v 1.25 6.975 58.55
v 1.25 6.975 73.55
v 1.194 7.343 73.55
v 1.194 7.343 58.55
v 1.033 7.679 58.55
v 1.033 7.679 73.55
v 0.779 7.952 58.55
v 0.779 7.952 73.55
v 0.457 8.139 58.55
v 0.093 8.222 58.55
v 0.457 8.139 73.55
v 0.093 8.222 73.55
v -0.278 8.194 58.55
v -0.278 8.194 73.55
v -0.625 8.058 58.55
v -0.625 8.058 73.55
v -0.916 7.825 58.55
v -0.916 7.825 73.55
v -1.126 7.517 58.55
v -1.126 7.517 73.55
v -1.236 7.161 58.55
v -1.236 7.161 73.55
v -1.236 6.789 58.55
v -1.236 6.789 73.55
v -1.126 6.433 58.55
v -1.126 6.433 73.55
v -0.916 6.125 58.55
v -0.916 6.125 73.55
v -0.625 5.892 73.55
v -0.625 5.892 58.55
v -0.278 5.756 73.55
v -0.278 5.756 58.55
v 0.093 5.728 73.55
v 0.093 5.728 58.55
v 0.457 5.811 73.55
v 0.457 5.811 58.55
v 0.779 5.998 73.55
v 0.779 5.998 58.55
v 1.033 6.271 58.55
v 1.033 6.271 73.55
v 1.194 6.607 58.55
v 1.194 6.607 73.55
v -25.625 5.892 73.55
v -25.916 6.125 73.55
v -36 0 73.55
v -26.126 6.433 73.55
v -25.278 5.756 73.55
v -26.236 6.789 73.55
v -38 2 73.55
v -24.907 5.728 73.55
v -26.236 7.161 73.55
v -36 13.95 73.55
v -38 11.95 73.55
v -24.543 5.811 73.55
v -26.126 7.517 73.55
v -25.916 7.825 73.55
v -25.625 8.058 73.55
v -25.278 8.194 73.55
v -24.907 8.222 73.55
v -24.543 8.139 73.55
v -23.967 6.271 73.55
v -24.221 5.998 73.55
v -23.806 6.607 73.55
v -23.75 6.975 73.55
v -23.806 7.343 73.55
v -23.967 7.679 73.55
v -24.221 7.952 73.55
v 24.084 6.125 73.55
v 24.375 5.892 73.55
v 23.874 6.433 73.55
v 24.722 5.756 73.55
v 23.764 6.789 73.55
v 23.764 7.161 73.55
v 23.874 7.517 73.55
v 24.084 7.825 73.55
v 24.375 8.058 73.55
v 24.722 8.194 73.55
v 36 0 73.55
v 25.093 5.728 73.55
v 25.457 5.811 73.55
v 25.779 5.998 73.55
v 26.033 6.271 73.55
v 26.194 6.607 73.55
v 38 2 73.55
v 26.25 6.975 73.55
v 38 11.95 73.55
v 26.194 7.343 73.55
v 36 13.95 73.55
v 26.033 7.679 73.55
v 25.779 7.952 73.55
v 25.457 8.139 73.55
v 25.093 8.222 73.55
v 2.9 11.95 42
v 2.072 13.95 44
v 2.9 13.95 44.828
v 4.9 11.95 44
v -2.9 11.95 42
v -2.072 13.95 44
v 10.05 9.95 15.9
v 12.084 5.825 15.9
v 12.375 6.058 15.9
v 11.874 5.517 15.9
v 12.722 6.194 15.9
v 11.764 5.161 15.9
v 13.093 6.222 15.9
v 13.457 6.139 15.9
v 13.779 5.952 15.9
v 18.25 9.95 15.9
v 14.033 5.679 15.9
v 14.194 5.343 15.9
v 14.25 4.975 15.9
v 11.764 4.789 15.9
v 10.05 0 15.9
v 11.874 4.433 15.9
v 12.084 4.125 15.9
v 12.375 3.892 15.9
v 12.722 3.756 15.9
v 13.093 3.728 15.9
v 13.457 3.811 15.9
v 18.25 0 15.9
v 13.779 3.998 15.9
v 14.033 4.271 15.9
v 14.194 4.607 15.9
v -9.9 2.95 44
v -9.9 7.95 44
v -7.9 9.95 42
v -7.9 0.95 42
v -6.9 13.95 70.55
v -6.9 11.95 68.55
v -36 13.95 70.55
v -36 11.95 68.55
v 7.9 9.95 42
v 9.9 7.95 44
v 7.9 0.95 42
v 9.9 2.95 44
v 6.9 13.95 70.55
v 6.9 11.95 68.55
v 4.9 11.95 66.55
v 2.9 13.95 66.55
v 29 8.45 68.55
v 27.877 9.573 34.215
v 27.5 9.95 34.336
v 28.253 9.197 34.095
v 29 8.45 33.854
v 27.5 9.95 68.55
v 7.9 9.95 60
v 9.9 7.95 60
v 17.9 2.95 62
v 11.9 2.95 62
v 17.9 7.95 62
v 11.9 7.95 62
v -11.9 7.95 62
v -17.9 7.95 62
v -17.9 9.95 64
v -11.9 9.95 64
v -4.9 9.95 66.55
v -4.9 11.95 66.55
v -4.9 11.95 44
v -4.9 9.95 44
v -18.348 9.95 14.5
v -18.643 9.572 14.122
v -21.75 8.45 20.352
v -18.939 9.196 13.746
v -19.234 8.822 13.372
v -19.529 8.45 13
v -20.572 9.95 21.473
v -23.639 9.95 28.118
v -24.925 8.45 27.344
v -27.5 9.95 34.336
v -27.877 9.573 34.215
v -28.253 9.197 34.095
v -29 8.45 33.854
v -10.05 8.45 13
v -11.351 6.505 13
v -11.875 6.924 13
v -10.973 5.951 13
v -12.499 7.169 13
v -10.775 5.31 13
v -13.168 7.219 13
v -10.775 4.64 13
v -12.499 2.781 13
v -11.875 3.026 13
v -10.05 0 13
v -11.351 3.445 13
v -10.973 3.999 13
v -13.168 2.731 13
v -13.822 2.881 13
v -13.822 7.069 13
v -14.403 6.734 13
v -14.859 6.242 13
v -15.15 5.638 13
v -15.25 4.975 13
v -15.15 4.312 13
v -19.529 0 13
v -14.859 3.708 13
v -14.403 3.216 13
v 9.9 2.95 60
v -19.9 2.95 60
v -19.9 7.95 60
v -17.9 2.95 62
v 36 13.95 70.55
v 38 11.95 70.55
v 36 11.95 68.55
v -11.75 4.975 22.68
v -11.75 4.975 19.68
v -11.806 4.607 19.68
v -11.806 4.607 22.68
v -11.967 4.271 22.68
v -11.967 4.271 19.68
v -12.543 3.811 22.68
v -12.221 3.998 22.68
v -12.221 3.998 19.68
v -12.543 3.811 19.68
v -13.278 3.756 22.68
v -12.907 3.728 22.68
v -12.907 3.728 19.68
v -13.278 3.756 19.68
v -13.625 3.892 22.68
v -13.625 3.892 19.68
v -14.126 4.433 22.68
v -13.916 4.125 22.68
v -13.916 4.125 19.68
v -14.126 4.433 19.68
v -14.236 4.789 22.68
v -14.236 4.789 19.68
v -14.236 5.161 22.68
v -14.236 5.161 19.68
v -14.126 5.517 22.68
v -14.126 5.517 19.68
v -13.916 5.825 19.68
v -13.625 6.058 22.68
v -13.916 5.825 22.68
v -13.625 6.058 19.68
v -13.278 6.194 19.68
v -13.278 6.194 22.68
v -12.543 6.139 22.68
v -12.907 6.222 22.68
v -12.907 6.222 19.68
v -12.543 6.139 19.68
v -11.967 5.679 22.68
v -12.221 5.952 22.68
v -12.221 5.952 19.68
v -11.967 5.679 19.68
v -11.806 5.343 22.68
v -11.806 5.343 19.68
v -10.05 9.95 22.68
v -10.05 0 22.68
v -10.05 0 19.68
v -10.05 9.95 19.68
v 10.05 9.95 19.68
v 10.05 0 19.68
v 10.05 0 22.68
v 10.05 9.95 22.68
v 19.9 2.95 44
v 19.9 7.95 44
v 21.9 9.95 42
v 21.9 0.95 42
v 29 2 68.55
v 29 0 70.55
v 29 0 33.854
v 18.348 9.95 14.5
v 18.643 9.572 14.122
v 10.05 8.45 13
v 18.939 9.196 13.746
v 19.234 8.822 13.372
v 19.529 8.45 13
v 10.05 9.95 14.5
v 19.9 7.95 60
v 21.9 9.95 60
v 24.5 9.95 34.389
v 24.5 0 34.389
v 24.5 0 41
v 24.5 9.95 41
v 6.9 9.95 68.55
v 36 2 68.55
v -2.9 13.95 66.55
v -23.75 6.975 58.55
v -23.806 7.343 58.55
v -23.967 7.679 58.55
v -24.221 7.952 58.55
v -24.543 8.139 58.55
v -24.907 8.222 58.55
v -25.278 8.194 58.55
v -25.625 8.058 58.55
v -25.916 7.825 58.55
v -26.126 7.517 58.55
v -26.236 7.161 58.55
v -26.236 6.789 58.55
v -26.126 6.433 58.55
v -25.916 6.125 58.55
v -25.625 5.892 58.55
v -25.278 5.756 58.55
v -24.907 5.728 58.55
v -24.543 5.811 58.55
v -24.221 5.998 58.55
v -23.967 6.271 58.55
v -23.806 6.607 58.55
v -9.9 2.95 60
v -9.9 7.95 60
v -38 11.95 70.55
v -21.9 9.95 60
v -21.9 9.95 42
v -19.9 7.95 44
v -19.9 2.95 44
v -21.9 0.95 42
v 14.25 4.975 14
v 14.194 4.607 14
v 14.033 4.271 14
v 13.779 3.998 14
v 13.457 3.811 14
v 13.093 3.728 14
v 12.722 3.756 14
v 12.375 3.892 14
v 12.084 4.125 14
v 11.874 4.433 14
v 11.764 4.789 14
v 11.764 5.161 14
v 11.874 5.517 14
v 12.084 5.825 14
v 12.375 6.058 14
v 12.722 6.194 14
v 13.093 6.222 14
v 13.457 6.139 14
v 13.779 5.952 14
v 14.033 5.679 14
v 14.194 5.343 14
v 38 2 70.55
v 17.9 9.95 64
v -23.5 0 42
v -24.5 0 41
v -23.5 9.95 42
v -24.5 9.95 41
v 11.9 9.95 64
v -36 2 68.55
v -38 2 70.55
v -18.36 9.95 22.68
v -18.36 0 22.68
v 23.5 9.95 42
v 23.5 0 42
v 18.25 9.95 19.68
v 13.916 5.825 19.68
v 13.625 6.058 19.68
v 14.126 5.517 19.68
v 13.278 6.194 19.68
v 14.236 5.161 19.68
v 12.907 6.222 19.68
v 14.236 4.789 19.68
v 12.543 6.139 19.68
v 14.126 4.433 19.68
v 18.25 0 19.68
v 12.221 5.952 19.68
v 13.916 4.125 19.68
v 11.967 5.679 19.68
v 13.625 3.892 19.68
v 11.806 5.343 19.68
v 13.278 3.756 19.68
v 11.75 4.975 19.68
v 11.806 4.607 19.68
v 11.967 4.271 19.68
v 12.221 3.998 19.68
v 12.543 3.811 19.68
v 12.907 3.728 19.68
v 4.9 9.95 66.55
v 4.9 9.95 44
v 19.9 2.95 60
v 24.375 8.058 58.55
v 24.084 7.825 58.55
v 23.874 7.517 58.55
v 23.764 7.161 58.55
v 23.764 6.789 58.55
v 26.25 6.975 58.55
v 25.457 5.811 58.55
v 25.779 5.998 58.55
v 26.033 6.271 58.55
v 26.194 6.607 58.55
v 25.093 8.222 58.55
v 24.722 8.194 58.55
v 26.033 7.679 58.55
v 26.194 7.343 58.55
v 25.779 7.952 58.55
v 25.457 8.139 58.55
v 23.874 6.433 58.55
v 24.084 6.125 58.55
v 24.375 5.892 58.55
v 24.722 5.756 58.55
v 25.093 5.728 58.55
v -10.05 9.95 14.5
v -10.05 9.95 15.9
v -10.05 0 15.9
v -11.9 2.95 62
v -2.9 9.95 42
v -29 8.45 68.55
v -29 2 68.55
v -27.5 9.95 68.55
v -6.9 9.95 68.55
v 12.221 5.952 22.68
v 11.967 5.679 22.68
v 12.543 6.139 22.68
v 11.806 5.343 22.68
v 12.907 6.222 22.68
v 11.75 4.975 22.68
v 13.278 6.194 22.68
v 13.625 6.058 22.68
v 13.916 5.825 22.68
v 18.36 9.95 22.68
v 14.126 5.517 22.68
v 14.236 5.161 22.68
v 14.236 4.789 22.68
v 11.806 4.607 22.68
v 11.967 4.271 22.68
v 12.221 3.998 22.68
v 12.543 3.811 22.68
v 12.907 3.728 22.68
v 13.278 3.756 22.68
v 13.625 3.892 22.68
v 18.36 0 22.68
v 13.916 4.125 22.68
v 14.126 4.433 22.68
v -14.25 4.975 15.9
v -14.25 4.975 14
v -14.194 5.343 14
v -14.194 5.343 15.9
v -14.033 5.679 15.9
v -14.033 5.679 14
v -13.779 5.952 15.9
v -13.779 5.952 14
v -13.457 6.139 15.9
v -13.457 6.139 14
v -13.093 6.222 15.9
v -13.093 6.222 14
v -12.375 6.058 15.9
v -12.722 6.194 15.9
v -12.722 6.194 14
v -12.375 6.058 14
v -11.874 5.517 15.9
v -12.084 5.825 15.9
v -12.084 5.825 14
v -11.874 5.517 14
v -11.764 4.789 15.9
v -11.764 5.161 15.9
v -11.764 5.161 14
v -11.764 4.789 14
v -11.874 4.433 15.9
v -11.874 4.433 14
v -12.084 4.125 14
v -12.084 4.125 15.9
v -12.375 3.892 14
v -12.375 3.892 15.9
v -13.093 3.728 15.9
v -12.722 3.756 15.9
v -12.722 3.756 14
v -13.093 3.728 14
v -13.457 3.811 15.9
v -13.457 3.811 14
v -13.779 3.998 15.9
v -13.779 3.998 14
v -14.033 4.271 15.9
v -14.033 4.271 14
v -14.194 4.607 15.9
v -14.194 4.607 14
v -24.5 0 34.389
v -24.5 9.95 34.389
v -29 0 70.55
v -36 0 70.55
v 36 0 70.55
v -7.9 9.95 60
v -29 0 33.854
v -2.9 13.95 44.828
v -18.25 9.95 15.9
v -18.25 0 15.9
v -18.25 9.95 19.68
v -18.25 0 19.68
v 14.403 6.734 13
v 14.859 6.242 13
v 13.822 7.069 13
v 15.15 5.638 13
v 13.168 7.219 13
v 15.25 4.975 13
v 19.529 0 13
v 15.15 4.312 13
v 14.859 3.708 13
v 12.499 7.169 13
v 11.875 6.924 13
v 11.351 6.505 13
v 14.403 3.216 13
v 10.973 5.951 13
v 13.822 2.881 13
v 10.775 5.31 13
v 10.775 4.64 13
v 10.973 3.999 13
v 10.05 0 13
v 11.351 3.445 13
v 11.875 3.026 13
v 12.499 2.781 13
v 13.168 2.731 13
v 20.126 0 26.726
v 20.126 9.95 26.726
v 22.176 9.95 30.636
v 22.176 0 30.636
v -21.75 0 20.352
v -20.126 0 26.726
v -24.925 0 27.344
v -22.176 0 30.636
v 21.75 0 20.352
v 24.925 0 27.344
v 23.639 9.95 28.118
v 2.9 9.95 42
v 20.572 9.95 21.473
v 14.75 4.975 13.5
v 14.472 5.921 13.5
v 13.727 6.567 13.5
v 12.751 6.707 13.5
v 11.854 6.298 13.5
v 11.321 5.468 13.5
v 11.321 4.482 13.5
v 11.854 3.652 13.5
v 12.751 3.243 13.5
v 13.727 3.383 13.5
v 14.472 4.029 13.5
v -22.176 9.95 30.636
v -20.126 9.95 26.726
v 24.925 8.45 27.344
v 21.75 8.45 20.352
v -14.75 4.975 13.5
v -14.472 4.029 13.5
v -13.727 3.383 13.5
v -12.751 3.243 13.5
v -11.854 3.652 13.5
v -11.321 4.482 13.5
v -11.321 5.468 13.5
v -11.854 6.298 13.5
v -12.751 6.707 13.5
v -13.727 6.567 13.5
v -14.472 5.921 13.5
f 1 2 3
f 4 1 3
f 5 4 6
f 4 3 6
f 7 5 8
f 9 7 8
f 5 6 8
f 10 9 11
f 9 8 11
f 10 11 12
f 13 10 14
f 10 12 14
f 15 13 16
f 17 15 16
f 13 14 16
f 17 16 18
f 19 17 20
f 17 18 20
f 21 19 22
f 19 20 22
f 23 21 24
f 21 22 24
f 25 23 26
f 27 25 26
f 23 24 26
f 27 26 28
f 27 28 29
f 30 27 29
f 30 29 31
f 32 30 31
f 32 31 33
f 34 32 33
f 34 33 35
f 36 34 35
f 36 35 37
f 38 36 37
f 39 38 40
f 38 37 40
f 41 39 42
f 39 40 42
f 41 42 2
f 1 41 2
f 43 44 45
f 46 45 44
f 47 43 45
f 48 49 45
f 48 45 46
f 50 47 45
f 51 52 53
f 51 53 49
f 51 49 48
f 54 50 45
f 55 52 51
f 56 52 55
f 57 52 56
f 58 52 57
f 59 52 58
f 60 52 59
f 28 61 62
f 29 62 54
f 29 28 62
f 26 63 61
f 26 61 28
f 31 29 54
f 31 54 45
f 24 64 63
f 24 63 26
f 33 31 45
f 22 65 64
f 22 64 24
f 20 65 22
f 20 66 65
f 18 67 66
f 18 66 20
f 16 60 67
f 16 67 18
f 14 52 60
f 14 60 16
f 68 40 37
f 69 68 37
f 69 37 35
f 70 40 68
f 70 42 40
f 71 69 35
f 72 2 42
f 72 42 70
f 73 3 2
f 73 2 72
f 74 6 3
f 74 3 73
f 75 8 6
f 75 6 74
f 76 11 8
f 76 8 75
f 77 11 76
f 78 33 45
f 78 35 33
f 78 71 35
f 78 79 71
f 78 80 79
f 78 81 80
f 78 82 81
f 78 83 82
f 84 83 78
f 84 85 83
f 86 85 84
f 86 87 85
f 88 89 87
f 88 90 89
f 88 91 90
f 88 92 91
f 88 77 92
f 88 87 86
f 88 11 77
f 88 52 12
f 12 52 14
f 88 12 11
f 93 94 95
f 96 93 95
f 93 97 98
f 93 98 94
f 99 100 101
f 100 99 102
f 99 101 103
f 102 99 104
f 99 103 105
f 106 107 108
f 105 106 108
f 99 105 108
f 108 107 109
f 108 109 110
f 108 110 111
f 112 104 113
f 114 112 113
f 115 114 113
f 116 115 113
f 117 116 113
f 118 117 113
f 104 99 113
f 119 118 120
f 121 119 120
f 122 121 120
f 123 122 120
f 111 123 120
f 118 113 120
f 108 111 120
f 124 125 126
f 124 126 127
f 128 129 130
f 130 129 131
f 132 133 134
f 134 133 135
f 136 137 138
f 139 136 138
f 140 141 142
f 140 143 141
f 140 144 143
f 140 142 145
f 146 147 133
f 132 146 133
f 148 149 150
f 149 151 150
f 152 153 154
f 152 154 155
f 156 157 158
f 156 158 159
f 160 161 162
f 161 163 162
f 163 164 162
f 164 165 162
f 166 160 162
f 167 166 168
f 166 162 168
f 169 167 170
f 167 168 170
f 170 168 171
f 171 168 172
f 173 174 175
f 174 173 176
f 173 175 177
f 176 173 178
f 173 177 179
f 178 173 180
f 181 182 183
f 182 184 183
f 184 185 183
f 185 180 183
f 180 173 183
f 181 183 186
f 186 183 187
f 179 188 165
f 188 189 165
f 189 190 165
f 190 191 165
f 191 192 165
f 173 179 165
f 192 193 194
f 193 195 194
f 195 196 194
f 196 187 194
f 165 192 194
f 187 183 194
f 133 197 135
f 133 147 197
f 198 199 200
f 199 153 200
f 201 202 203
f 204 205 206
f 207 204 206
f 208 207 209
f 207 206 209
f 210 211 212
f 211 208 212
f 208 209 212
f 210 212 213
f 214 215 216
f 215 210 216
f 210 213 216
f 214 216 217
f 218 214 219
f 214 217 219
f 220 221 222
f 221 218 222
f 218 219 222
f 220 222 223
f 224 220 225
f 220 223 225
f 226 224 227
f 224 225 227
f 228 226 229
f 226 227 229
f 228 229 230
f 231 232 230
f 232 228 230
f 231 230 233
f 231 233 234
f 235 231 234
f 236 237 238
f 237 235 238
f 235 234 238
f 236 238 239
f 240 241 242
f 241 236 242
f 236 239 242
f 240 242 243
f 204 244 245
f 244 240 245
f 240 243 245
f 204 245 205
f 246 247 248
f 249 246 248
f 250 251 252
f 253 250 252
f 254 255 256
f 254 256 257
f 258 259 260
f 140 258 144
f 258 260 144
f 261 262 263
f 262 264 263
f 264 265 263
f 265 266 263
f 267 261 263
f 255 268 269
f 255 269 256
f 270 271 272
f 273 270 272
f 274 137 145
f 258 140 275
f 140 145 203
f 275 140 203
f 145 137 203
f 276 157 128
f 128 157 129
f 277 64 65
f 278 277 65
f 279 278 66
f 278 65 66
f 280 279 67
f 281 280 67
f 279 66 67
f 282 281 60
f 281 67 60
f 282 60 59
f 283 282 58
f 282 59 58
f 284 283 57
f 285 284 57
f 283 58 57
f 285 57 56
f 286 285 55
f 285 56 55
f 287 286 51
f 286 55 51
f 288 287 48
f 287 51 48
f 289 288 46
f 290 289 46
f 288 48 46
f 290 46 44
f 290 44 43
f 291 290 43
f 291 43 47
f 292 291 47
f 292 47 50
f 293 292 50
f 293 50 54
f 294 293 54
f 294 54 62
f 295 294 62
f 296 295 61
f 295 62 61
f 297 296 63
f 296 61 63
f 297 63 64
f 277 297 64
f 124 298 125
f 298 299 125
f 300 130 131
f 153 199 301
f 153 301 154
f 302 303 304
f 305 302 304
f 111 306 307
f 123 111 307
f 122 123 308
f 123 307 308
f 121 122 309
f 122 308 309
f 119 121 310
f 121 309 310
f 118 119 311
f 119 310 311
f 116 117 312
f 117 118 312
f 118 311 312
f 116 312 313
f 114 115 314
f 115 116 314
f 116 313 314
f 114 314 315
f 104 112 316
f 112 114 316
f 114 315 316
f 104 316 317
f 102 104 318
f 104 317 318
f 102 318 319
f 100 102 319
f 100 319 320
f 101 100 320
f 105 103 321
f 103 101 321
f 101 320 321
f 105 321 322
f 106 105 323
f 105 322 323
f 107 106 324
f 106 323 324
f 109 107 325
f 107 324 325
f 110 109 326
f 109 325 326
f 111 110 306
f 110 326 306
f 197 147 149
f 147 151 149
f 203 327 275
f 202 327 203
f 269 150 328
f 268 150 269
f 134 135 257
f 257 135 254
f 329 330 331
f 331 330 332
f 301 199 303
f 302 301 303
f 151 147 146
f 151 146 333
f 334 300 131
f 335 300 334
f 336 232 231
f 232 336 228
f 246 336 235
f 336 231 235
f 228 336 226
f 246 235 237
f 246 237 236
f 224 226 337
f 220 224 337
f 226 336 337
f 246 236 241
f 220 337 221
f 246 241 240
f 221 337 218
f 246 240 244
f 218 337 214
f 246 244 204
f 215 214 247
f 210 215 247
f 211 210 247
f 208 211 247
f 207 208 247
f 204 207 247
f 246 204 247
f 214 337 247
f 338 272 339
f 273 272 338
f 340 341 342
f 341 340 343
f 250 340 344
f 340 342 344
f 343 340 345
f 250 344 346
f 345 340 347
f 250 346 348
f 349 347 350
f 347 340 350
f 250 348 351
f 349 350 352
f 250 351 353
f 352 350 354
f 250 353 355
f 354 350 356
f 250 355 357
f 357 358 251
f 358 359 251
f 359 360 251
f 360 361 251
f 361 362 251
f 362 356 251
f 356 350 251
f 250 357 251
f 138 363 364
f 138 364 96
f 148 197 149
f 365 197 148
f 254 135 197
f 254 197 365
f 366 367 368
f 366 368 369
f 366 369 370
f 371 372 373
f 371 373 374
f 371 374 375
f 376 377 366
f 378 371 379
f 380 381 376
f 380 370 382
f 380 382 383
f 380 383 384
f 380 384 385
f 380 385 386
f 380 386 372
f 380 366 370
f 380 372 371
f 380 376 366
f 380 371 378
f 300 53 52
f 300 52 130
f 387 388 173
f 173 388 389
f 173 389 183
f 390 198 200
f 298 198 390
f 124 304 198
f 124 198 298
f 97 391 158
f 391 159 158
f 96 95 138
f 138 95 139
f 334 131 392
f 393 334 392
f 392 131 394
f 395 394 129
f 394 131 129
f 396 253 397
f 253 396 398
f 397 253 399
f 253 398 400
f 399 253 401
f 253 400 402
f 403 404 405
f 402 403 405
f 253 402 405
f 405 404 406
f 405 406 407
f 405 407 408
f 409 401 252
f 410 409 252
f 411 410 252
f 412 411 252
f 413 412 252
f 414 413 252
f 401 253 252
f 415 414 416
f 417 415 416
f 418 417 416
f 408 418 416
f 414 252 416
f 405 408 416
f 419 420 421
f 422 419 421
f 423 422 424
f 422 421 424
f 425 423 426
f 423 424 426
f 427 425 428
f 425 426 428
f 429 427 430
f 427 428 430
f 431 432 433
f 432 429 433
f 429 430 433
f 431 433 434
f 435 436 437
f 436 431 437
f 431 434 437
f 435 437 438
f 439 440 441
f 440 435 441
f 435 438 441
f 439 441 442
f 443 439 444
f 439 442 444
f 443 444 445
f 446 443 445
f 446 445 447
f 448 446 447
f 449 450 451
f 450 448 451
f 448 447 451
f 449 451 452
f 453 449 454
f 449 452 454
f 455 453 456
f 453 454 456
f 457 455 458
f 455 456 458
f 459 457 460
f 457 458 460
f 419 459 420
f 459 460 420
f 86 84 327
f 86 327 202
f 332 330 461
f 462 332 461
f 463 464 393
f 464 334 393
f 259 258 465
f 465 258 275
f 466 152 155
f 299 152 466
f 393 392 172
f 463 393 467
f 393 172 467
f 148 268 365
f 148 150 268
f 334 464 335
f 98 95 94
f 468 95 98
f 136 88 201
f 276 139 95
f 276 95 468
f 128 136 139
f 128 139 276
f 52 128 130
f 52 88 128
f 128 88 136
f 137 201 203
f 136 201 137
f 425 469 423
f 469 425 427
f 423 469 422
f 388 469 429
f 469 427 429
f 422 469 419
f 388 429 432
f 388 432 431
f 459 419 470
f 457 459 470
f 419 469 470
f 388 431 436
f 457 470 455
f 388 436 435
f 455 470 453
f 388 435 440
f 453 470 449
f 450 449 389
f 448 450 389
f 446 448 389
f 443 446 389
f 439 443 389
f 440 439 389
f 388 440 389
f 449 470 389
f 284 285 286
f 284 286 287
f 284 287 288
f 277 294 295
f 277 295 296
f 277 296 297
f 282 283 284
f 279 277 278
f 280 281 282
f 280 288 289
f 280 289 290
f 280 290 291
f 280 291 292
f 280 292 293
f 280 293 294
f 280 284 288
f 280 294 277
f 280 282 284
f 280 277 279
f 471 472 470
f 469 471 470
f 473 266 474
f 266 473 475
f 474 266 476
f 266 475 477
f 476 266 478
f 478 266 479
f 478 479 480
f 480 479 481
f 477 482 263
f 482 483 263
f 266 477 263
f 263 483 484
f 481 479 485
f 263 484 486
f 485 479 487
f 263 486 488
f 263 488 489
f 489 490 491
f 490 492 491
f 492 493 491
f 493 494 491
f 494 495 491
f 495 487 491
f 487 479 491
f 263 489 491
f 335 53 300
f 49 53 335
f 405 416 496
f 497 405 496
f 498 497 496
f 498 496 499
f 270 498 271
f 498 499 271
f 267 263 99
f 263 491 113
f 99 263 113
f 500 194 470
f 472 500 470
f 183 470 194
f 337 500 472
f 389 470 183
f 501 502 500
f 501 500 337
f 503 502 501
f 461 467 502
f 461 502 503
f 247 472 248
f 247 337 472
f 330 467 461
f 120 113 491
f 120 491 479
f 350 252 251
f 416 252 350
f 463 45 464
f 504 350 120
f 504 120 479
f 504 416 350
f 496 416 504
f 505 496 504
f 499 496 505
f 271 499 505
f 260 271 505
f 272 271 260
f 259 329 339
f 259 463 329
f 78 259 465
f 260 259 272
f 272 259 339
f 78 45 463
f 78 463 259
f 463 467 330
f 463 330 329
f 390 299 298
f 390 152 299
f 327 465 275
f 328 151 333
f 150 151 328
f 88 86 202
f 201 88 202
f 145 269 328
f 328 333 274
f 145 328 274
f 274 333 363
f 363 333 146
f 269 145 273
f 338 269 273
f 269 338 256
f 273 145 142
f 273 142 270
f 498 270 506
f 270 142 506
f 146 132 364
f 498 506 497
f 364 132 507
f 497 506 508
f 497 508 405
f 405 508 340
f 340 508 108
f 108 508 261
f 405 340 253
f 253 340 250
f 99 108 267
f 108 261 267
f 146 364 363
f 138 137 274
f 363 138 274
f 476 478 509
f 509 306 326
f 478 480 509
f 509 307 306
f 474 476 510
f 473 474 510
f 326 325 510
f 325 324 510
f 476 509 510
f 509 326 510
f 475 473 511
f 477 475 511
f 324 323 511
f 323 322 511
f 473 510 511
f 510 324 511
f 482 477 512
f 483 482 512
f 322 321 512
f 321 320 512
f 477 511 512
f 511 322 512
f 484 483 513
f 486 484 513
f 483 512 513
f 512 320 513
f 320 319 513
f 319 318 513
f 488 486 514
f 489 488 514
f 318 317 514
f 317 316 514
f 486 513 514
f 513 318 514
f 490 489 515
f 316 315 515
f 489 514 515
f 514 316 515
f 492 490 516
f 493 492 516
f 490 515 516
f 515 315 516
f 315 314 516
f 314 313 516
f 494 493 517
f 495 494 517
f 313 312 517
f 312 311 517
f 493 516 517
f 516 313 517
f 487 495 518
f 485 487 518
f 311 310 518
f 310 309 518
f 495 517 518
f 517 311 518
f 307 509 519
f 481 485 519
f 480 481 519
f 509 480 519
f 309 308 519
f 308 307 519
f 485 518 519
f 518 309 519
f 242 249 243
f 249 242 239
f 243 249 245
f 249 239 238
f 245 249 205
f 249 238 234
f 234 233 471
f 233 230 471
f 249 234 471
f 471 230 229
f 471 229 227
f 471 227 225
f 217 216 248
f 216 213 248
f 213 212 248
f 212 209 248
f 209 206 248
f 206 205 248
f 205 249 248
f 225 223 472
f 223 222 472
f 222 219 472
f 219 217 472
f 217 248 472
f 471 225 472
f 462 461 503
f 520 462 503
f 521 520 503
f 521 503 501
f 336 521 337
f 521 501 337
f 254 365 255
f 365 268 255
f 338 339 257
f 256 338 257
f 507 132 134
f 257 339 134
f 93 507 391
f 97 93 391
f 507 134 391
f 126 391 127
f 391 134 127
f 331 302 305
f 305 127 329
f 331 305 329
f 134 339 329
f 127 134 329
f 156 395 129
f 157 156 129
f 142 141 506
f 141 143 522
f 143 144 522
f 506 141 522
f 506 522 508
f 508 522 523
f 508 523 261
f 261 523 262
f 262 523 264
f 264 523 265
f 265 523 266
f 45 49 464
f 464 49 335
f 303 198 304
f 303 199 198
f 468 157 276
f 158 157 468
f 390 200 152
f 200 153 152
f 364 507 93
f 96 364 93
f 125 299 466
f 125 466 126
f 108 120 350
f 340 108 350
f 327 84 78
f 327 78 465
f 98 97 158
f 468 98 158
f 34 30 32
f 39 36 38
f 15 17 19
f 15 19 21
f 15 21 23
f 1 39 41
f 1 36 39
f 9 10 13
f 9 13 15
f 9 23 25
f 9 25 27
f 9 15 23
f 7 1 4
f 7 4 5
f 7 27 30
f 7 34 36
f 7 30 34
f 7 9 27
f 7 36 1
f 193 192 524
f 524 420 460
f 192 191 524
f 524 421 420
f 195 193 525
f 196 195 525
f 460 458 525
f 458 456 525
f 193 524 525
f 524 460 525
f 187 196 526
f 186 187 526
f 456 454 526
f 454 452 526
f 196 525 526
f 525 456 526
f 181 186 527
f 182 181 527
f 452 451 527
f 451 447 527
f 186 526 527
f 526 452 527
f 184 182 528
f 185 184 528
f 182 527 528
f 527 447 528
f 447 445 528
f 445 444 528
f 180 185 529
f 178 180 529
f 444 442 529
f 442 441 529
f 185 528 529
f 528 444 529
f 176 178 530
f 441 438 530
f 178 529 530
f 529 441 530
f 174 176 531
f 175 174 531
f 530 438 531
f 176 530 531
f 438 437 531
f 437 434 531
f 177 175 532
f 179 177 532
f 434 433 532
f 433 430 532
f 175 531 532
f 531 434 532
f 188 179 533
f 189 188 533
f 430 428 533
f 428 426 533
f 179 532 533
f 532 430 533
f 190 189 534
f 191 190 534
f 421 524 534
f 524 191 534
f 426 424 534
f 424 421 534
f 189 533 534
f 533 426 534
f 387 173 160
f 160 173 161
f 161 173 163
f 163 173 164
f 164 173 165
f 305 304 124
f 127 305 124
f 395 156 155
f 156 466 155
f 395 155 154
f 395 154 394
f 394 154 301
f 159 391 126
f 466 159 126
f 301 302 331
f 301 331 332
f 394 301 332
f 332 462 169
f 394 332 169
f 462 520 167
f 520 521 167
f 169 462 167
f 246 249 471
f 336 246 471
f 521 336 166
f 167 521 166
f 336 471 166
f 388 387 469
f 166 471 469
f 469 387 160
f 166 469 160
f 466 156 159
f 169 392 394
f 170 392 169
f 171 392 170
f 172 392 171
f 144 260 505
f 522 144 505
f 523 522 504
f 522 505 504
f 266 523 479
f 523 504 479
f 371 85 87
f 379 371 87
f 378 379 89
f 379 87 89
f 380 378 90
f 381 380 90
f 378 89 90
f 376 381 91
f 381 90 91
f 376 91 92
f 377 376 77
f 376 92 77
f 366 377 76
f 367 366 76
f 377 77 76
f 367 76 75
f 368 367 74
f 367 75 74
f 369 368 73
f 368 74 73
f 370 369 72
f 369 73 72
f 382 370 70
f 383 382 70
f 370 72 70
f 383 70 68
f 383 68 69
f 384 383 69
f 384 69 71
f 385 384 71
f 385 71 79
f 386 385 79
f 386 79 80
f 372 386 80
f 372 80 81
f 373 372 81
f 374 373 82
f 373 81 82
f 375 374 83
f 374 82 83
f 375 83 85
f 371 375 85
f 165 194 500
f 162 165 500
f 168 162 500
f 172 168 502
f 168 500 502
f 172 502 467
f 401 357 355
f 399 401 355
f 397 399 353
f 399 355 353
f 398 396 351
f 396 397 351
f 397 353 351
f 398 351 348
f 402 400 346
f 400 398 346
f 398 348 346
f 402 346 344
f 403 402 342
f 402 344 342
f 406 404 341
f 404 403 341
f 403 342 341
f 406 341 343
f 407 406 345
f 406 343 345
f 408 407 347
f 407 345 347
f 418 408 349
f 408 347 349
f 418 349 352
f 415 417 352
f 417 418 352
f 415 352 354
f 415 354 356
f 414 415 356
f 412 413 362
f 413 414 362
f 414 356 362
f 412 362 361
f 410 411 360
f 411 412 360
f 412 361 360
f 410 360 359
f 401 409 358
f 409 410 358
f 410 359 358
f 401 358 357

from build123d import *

# Parameters (mm, degrees)
BOSS_EXTRUDE1_DEPTH = 9.95
SKETCH2_W           = 58
SKETCH2_H           = 9.95
BOSS_EXTRUDE2_DEPTH = 8.55
SKETCH3_W           = 9.8
SKETCH3_H           = 11.55
BOSS_EXTRUDE3_DEPTH = 4
BOSS_EXTRUDE4_DEPTH = 20
CHAMFER1_SIZE       = 2
CUT_EXTRUDE1_REACH  = 70.57
CHAMFER2_SIZE       = 1
BOSS_EXTRUDE5_DEPTH = 5
CHAMFER3_SIZE       = 2
SKETCH7_W           = 10
SKETCH7_H           = 20
CUT_EXTRUDE2_DEPTH  = 7
CHAMFER4_SIZE       = 2
CHAMFER5_SIZE       = 1
SKETCH8_R           = 1.25
CUT_EXTRUDE3_DEPTH  = 15
CHAMFER6_SIZE       = 1.5
CHAMFER7_SIZE       = 2


with BuildPart() as part:
    # Sketch1 → Boss-Extrude1 (new body)
    with BuildSketch(Plane(origin=(0, 0, 0), x_dir=(1, 0, 0), z_dir=(0, 1, 0))):
        with BuildLine():
            Line((-10.05, -13), (-19.52904451, -13))
            ThreePointArc((-19.52904451, -13), (-23.22122875, -23.900809511), (-29, -33.853983643))
            Line((-29, -33.853983643), (-29, -45))
            Line((-29, -45), (29, -45))
            Line((29, -45), (29, -33.853983643))
            ThreePointArc((29, -33.853983643), (23.22122875, -23.900809511), (19.52904451, -13))
            Line((19.52904451, -13), (10.05, -13))
            Line((10.05, -13), (10.05, -15.9))
            Line((10.05, -15.9), (18.25, -15.9))
            Line((18.25, -15.9), (18.25, -19.68))
            Line((18.25, -19.68), (10.05, -19.68))
            Line((10.05, -19.68), (10.05, -22.68))
            Line((10.05, -22.68), (18.360244512, -22.68))
            ThreePointArc((18.360244512, -22.68), (21.116099011, -28.699201931), (24.5, -34.389082421))
            Line((24.5, -34.389082421), (24.5, -42))
            Line((24.5, -42), (-24.5, -42))
            Line((-24.5, -42), (-24.5, -34.389082421))
            ThreePointArc((-24.5, -34.389082421), (-21.116099011, -28.699201931), (-18.360244512, -22.68))
            Line((-18.360244512, -22.68), (-10.05, -22.68))
            Line((-10.05, -22.68), (-10.05, -19.68))
            Line((-10.05, -19.68), (-18.25, -19.68))
            Line((-18.25, -19.68), (-18.25, -15.9))
            Line((-18.25, -15.9), (-10.05, -15.9))
            Line((-10.05, -15.9), (-10.05, -13))
        make_face()
    extrude(amount=BOSS_EXTRUDE1_DEPTH)

    # Sketch2 → Boss-Extrude2 (add)
    with BuildSketch(Plane.XY.offset(45)):
        with Locations((0, 4.975)):
            Rectangle(SKETCH2_W, SKETCH2_H)
    extrude(amount=BOSS_EXTRUDE2_DEPTH)

    # Sketch3 → Boss-Extrude3 (add)
    with BuildSketch(Plane(origin=(0, 9.95, 0), x_dir=(1, 0, 0), z_dir=(0, 1, 0))):
        with Locations((0, -47.775)):
            Rectangle(SKETCH3_W, SKETCH3_H)
    extrude(amount=BOSS_EXTRUDE3_DEPTH)

    # Sketch4 → Boss-Extrude4 (add)
    with BuildSketch(Plane.XY.offset(53.55)):
        Polygon((-29, 9.95), (-29, 0), (29, 0), (29, 9.95), (4.9, 9.95), (4.9, 13.95), (-4.9, 13.95), (-4.9, 9.95), align=None)
    extrude(amount=BOSS_EXTRUDE4_DEPTH)

    # Chamfer1
    chamfer1_edges = [part.edges().sort_by_distance(p)[0] for p in [
        (4.9, 11.95, 42),
        (-4.9, 11.95, 42),
    ]]
    chamfer(chamfer1_edges, length=CHAMFER1_SIZE)

    # Cut-Extrude1: up to this face of the body (flat: up to its plane)
    cut_extrude1_end = Plane(part.part.faces().sort_by_distance((14.205122256, 4.975, 22.68))[0])
    # Sketch5 → Cut-Extrude1 (cut, up to the picked face)
    with BuildSketch(Plane(origin=(0, 0, 13), x_dir=(-1, 0, 0), z_dir=(0, 0, -1)), mode=Mode.PRIVATE) as cut_extrude1_sk1:
        with BuildLine():
            ThreePointArc((-14.25, 4.975), (-13, 3.725), (-11.75, 4.975))
            Line((-11.75, 4.975), (-14.25, 4.975))
        make_face()
    cut_extrude1_tool1 = split(extrude(cut_extrude1_sk1.sketch, amount=-CUT_EXTRUDE1_REACH, mode=Mode.PRIVATE), bisect_by=cut_extrude1_end, keep=Keep.BOTH, mode=Mode.PRIVATE)
    # Sketch5 → Cut-Extrude1 (cut, up to the picked face)
    with BuildSketch(Plane(origin=(0, 0, 13), x_dir=(-1, 0, 0), z_dir=(0, 0, -1)), mode=Mode.PRIVATE) as cut_extrude1_sk2:
        with BuildLine():
            Line((-14.25, 4.975), (-11.75, 4.975))
            ThreePointArc((-11.75, 4.975), (-13, 6.225), (-14.25, 4.975))
        make_face()
    cut_extrude1_tool2 = split(extrude(cut_extrude1_sk2.sketch, amount=-CUT_EXTRUDE1_REACH, mode=Mode.PRIVATE), bisect_by=cut_extrude1_end, keep=Keep.BOTH, mode=Mode.PRIVATE)
    # Sketch5 → Cut-Extrude1 (cut, up to the picked face)
    with BuildSketch(Plane(origin=(0, 0, 13), x_dir=(-1, 0, 0), z_dir=(0, 0, -1)), mode=Mode.PRIVATE) as cut_extrude1_sk3:
        with BuildLine():
            ThreePointArc((-14.25, 4.975), (-13, 3.725), (-11.75, 4.975))
            Line((-11.75, 4.975), (-14.25, 4.975))
        make_face()
    cut_extrude1_tool3 = split(extrude(cut_extrude1_sk3.sketch, amount=-CUT_EXTRUDE1_REACH, mode=Mode.PRIVATE), bisect_by=cut_extrude1_end, keep=Keep.BOTH, mode=Mode.PRIVATE)
    # Sketch5 → Cut-Extrude1 (cut, up to the picked face)
    with BuildSketch(Plane(origin=(0, 0, 13), x_dir=(-1, 0, 0), z_dir=(0, 0, -1)), mode=Mode.PRIVATE) as cut_extrude1_sk4:
        with BuildLine():
            Line((-14.25, 4.975), (-11.75, 4.975))
            ThreePointArc((-11.75, 4.975), (-13, 6.225), (-14.25, 4.975))
        make_face()
    cut_extrude1_tool4 = split(extrude(cut_extrude1_sk4.sketch, amount=-CUT_EXTRUDE1_REACH, mode=Mode.PRIVATE), bisect_by=cut_extrude1_end, keep=Keep.BOTH, mode=Mode.PRIVATE)
    # Sketch5 → Cut-Extrude1 (cut, up to the picked face)
    with BuildSketch(Plane(origin=(0, 0, 13), x_dir=(-1, 0, 0), z_dir=(0, 0, -1)), mode=Mode.PRIVATE) as cut_extrude1_sk5:
        with BuildLine():
            ThreePointArc((14.25, 4.975), (13, 6.225), (11.75, 4.975))
            Line((11.75, 4.975), (14.25, 4.975))
        make_face()
    cut_extrude1_tool5 = split(extrude(cut_extrude1_sk5.sketch, amount=-CUT_EXTRUDE1_REACH, mode=Mode.PRIVATE), bisect_by=cut_extrude1_end, keep=Keep.BOTH, mode=Mode.PRIVATE)
    # Sketch5 → Cut-Extrude1 (cut, up to the picked face)
    with BuildSketch(Plane(origin=(0, 0, 13), x_dir=(-1, 0, 0), z_dir=(0, 0, -1)), mode=Mode.PRIVATE) as cut_extrude1_sk6:
        with BuildLine():
            Line((14.25, 4.975), (11.75, 4.975))
            ThreePointArc((11.75, 4.975), (13, 3.725), (14.25, 4.975))
        make_face()
    cut_extrude1_tool6 = split(extrude(cut_extrude1_sk6.sketch, amount=-CUT_EXTRUDE1_REACH, mode=Mode.PRIVATE), bisect_by=cut_extrude1_end, keep=Keep.BOTH, mode=Mode.PRIVATE)
    # Sketch5 → Cut-Extrude1 (cut, up to the picked face)
    with BuildSketch(Plane(origin=(0, 0, 13), x_dir=(-1, 0, 0), z_dir=(0, 0, -1)), mode=Mode.PRIVATE) as cut_extrude1_sk7:
        with BuildLine():
            ThreePointArc((14.25, 4.975), (13, 6.225), (11.75, 4.975))
            Line((11.75, 4.975), (14.25, 4.975))
        make_face()
    cut_extrude1_tool7 = split(extrude(cut_extrude1_sk7.sketch, amount=-CUT_EXTRUDE1_REACH, mode=Mode.PRIVATE), bisect_by=cut_extrude1_end, keep=Keep.BOTH, mode=Mode.PRIVATE)
    # Sketch5 → Cut-Extrude1 (cut, up to the picked face)
    with BuildSketch(Plane(origin=(0, 0, 13), x_dir=(-1, 0, 0), z_dir=(0, 0, -1)), mode=Mode.PRIVATE) as cut_extrude1_sk8:
        with BuildLine():
            Line((14.25, 4.975), (11.75, 4.975))
            ThreePointArc((11.75, 4.975), (13, 3.725), (14.25, 4.975))
        make_face()
    cut_extrude1_tool8 = split(extrude(cut_extrude1_sk8.sketch, amount=-CUT_EXTRUDE1_REACH, mode=Mode.PRIVATE), bisect_by=cut_extrude1_end, keep=Keep.BOTH, mode=Mode.PRIVATE)
    add(cut_extrude1_tool1.solids().sort_by(Axis((13, 4.444484, 13), (0, 0, 1)))[0], mode=Mode.SUBTRACT)
    add(cut_extrude1_tool2.solids().sort_by(Axis((13, 5.505516, 13), (0, 0, 1)))[0], mode=Mode.SUBTRACT)
    add(cut_extrude1_tool3.solids().sort_by(Axis((13, 4.444484, 13), (0, 0, 1)))[0], mode=Mode.SUBTRACT)
    add(cut_extrude1_tool4.solids().sort_by(Axis((13, 5.505516, 13), (0, 0, 1)))[0], mode=Mode.SUBTRACT)
    add(cut_extrude1_tool5.solids().sort_by(Axis((-13, 5.505516, 13), (0, 0, 1)))[0], mode=Mode.SUBTRACT)
    add(cut_extrude1_tool6.solids().sort_by(Axis((-13, 4.444484, 13), (0, 0, 1)))[0], mode=Mode.SUBTRACT)
    add(cut_extrude1_tool7.solids().sort_by(Axis((-13, 5.505516, 13), (0, 0, 1)))[0], mode=Mode.SUBTRACT)
    add(cut_extrude1_tool8.solids().sort_by(Axis((-13, 4.444484, 13), (0, 0, 1)))[0], mode=Mode.SUBTRACT)

    # Chamfer2
    chamfer2_edges = [part.edges().sort_by_distance(p)[0] for p in [
        (11.75, 4.975, 13),
        (-11.75, 4.975, 13),
    ]]
    chamfer(chamfer2_edges, length=CHAMFER2_SIZE)

    # Sketch6 → Boss-Extrude5 (add)
    with BuildSketch(Plane.XY.offset(73.55)):
        Polygon((29, 9.95), (29, 0), (38, 0), (38, 13.95), (4.9, 13.95), (4.9, 9.95), align=None)
        Polygon((-38, 13.95), (-38, 0), (-29, 0), (-29, 9.95), (-4.9, 9.95), (-4.9, 13.95), align=None)
    extrude(amount=-BOSS_EXTRUDE5_DEPTH)

    # Chamfer3
    chamfer3_edges = [part.edges().sort_by_distance(p)[0] for p in [
        (0, 13.95, 42),
        (3.9, 13.95, 43),
        (-3.9, 13.95, 43),
        (4.9, 13.95, 56.275),
        (33.5, 0, 68.55),
        (38, 0, 71.05),
        (38, 6.975, 68.55),
        (38, 13.95, 71.05),
        (4.9, 11.95, 68.55),
        (21.45, 13.95, 68.55),
        (-4.9, 13.95, 56.275),
        (-38, 13.95, 71.05),
        (-33.5, 0, 68.55),
        (-38, 0, 71.05),
        (-21.45, 13.95, 68.55),
        (-4.9, 11.95, 68.55),
        (-38, 6.975, 68.55),
    ]]
    chamfer(chamfer3_edges, length=CHAMFER3_SIZE)

    # Sketch7 → Cut-Extrude2 (cut)
    with BuildSketch(Plane(origin=(0, 9.95, 0), x_dir=(1, 0, 0), z_dir=(0, 1, 0))):
        with Locations((-14.9, -52)):
            Rectangle(SKETCH7_W, SKETCH7_H)
        with Locations((14.9, -52)):
            Rectangle(SKETCH7_W, SKETCH7_H)
    extrude(amount=-CUT_EXTRUDE2_DEPTH, mode=Mode.SUBTRACT)

    # Chamfer4
    chamfer4_edges = [part.edges().sort_by_distance(p)[0] for p in [
        (-9.9, 9.95, 52),
        (-9.9, 6.45, 42),
        (-9.9, 6.45, 62),
        (-19.9, 6.45, 62),
        (-19.9, 6.45, 42),
        (-19.9, 9.95, 52),
        (-14.9, 9.95, 62),
        (19.9, 9.95, 52),
        (19.9, 6.45, 42),
        (19.9, 6.45, 62),
        (9.9, 6.45, 62),
        (9.9, 6.45, 42),
        (9.9, 9.95, 52),
        (14.9, 9.95, 62),
    ]]
    chamfer(chamfer4_edges, length=CHAMFER4_SIZE)

    # Chamfer5
    chamfer5_edges = [part.edges().sort_by_distance(p)[0] for p in [
        (-24.5, 4.975, 42),
        (24.5, 4.975, 42),
    ]]
    chamfer(chamfer5_edges, length=CHAMFER5_SIZE)

    # Sketch8 → Cut-Extrude3 (cut)
    with BuildSketch(Plane.XY.offset(73.55)):
        with Locations((-25, 6.975)):
            Circle(SKETCH8_R)
        with Locations((25, 6.975)):
            Circle(SKETCH8_R)
        with Locations((0, 6.975)):
            Circle(SKETCH8_R)
    extrude(amount=-CUT_EXTRUDE3_DEPTH, mode=Mode.SUBTRACT)

    # Chamfer6
    chamfer6_edges = [part.edges().sort_by_distance(p)[0] for p in [
        (-29, 9.95, 51.201991821),
        (-14.789522255, 9.95, 13),
        (-23.22122875, 9.95, 23.900809511),
        (29, 9.95, 51.201991821),
        (23.22122875, 9.95, 23.900809511),
        (14.789522255, 9.95, 13),
    ]]
    chamfer(chamfer6_edges, length=CHAMFER6_SIZE)

    # Chamfer7
    chamfer7_edges = [part.edges().sort_by_distance(p)[0] for p in [
        (-14.9, 2.95, 42),
        (14.9, 2.95, 42),
    ]]
    chamfer(chamfer7_edges, length=CHAMFER7_SIZE)


solid = part.part
